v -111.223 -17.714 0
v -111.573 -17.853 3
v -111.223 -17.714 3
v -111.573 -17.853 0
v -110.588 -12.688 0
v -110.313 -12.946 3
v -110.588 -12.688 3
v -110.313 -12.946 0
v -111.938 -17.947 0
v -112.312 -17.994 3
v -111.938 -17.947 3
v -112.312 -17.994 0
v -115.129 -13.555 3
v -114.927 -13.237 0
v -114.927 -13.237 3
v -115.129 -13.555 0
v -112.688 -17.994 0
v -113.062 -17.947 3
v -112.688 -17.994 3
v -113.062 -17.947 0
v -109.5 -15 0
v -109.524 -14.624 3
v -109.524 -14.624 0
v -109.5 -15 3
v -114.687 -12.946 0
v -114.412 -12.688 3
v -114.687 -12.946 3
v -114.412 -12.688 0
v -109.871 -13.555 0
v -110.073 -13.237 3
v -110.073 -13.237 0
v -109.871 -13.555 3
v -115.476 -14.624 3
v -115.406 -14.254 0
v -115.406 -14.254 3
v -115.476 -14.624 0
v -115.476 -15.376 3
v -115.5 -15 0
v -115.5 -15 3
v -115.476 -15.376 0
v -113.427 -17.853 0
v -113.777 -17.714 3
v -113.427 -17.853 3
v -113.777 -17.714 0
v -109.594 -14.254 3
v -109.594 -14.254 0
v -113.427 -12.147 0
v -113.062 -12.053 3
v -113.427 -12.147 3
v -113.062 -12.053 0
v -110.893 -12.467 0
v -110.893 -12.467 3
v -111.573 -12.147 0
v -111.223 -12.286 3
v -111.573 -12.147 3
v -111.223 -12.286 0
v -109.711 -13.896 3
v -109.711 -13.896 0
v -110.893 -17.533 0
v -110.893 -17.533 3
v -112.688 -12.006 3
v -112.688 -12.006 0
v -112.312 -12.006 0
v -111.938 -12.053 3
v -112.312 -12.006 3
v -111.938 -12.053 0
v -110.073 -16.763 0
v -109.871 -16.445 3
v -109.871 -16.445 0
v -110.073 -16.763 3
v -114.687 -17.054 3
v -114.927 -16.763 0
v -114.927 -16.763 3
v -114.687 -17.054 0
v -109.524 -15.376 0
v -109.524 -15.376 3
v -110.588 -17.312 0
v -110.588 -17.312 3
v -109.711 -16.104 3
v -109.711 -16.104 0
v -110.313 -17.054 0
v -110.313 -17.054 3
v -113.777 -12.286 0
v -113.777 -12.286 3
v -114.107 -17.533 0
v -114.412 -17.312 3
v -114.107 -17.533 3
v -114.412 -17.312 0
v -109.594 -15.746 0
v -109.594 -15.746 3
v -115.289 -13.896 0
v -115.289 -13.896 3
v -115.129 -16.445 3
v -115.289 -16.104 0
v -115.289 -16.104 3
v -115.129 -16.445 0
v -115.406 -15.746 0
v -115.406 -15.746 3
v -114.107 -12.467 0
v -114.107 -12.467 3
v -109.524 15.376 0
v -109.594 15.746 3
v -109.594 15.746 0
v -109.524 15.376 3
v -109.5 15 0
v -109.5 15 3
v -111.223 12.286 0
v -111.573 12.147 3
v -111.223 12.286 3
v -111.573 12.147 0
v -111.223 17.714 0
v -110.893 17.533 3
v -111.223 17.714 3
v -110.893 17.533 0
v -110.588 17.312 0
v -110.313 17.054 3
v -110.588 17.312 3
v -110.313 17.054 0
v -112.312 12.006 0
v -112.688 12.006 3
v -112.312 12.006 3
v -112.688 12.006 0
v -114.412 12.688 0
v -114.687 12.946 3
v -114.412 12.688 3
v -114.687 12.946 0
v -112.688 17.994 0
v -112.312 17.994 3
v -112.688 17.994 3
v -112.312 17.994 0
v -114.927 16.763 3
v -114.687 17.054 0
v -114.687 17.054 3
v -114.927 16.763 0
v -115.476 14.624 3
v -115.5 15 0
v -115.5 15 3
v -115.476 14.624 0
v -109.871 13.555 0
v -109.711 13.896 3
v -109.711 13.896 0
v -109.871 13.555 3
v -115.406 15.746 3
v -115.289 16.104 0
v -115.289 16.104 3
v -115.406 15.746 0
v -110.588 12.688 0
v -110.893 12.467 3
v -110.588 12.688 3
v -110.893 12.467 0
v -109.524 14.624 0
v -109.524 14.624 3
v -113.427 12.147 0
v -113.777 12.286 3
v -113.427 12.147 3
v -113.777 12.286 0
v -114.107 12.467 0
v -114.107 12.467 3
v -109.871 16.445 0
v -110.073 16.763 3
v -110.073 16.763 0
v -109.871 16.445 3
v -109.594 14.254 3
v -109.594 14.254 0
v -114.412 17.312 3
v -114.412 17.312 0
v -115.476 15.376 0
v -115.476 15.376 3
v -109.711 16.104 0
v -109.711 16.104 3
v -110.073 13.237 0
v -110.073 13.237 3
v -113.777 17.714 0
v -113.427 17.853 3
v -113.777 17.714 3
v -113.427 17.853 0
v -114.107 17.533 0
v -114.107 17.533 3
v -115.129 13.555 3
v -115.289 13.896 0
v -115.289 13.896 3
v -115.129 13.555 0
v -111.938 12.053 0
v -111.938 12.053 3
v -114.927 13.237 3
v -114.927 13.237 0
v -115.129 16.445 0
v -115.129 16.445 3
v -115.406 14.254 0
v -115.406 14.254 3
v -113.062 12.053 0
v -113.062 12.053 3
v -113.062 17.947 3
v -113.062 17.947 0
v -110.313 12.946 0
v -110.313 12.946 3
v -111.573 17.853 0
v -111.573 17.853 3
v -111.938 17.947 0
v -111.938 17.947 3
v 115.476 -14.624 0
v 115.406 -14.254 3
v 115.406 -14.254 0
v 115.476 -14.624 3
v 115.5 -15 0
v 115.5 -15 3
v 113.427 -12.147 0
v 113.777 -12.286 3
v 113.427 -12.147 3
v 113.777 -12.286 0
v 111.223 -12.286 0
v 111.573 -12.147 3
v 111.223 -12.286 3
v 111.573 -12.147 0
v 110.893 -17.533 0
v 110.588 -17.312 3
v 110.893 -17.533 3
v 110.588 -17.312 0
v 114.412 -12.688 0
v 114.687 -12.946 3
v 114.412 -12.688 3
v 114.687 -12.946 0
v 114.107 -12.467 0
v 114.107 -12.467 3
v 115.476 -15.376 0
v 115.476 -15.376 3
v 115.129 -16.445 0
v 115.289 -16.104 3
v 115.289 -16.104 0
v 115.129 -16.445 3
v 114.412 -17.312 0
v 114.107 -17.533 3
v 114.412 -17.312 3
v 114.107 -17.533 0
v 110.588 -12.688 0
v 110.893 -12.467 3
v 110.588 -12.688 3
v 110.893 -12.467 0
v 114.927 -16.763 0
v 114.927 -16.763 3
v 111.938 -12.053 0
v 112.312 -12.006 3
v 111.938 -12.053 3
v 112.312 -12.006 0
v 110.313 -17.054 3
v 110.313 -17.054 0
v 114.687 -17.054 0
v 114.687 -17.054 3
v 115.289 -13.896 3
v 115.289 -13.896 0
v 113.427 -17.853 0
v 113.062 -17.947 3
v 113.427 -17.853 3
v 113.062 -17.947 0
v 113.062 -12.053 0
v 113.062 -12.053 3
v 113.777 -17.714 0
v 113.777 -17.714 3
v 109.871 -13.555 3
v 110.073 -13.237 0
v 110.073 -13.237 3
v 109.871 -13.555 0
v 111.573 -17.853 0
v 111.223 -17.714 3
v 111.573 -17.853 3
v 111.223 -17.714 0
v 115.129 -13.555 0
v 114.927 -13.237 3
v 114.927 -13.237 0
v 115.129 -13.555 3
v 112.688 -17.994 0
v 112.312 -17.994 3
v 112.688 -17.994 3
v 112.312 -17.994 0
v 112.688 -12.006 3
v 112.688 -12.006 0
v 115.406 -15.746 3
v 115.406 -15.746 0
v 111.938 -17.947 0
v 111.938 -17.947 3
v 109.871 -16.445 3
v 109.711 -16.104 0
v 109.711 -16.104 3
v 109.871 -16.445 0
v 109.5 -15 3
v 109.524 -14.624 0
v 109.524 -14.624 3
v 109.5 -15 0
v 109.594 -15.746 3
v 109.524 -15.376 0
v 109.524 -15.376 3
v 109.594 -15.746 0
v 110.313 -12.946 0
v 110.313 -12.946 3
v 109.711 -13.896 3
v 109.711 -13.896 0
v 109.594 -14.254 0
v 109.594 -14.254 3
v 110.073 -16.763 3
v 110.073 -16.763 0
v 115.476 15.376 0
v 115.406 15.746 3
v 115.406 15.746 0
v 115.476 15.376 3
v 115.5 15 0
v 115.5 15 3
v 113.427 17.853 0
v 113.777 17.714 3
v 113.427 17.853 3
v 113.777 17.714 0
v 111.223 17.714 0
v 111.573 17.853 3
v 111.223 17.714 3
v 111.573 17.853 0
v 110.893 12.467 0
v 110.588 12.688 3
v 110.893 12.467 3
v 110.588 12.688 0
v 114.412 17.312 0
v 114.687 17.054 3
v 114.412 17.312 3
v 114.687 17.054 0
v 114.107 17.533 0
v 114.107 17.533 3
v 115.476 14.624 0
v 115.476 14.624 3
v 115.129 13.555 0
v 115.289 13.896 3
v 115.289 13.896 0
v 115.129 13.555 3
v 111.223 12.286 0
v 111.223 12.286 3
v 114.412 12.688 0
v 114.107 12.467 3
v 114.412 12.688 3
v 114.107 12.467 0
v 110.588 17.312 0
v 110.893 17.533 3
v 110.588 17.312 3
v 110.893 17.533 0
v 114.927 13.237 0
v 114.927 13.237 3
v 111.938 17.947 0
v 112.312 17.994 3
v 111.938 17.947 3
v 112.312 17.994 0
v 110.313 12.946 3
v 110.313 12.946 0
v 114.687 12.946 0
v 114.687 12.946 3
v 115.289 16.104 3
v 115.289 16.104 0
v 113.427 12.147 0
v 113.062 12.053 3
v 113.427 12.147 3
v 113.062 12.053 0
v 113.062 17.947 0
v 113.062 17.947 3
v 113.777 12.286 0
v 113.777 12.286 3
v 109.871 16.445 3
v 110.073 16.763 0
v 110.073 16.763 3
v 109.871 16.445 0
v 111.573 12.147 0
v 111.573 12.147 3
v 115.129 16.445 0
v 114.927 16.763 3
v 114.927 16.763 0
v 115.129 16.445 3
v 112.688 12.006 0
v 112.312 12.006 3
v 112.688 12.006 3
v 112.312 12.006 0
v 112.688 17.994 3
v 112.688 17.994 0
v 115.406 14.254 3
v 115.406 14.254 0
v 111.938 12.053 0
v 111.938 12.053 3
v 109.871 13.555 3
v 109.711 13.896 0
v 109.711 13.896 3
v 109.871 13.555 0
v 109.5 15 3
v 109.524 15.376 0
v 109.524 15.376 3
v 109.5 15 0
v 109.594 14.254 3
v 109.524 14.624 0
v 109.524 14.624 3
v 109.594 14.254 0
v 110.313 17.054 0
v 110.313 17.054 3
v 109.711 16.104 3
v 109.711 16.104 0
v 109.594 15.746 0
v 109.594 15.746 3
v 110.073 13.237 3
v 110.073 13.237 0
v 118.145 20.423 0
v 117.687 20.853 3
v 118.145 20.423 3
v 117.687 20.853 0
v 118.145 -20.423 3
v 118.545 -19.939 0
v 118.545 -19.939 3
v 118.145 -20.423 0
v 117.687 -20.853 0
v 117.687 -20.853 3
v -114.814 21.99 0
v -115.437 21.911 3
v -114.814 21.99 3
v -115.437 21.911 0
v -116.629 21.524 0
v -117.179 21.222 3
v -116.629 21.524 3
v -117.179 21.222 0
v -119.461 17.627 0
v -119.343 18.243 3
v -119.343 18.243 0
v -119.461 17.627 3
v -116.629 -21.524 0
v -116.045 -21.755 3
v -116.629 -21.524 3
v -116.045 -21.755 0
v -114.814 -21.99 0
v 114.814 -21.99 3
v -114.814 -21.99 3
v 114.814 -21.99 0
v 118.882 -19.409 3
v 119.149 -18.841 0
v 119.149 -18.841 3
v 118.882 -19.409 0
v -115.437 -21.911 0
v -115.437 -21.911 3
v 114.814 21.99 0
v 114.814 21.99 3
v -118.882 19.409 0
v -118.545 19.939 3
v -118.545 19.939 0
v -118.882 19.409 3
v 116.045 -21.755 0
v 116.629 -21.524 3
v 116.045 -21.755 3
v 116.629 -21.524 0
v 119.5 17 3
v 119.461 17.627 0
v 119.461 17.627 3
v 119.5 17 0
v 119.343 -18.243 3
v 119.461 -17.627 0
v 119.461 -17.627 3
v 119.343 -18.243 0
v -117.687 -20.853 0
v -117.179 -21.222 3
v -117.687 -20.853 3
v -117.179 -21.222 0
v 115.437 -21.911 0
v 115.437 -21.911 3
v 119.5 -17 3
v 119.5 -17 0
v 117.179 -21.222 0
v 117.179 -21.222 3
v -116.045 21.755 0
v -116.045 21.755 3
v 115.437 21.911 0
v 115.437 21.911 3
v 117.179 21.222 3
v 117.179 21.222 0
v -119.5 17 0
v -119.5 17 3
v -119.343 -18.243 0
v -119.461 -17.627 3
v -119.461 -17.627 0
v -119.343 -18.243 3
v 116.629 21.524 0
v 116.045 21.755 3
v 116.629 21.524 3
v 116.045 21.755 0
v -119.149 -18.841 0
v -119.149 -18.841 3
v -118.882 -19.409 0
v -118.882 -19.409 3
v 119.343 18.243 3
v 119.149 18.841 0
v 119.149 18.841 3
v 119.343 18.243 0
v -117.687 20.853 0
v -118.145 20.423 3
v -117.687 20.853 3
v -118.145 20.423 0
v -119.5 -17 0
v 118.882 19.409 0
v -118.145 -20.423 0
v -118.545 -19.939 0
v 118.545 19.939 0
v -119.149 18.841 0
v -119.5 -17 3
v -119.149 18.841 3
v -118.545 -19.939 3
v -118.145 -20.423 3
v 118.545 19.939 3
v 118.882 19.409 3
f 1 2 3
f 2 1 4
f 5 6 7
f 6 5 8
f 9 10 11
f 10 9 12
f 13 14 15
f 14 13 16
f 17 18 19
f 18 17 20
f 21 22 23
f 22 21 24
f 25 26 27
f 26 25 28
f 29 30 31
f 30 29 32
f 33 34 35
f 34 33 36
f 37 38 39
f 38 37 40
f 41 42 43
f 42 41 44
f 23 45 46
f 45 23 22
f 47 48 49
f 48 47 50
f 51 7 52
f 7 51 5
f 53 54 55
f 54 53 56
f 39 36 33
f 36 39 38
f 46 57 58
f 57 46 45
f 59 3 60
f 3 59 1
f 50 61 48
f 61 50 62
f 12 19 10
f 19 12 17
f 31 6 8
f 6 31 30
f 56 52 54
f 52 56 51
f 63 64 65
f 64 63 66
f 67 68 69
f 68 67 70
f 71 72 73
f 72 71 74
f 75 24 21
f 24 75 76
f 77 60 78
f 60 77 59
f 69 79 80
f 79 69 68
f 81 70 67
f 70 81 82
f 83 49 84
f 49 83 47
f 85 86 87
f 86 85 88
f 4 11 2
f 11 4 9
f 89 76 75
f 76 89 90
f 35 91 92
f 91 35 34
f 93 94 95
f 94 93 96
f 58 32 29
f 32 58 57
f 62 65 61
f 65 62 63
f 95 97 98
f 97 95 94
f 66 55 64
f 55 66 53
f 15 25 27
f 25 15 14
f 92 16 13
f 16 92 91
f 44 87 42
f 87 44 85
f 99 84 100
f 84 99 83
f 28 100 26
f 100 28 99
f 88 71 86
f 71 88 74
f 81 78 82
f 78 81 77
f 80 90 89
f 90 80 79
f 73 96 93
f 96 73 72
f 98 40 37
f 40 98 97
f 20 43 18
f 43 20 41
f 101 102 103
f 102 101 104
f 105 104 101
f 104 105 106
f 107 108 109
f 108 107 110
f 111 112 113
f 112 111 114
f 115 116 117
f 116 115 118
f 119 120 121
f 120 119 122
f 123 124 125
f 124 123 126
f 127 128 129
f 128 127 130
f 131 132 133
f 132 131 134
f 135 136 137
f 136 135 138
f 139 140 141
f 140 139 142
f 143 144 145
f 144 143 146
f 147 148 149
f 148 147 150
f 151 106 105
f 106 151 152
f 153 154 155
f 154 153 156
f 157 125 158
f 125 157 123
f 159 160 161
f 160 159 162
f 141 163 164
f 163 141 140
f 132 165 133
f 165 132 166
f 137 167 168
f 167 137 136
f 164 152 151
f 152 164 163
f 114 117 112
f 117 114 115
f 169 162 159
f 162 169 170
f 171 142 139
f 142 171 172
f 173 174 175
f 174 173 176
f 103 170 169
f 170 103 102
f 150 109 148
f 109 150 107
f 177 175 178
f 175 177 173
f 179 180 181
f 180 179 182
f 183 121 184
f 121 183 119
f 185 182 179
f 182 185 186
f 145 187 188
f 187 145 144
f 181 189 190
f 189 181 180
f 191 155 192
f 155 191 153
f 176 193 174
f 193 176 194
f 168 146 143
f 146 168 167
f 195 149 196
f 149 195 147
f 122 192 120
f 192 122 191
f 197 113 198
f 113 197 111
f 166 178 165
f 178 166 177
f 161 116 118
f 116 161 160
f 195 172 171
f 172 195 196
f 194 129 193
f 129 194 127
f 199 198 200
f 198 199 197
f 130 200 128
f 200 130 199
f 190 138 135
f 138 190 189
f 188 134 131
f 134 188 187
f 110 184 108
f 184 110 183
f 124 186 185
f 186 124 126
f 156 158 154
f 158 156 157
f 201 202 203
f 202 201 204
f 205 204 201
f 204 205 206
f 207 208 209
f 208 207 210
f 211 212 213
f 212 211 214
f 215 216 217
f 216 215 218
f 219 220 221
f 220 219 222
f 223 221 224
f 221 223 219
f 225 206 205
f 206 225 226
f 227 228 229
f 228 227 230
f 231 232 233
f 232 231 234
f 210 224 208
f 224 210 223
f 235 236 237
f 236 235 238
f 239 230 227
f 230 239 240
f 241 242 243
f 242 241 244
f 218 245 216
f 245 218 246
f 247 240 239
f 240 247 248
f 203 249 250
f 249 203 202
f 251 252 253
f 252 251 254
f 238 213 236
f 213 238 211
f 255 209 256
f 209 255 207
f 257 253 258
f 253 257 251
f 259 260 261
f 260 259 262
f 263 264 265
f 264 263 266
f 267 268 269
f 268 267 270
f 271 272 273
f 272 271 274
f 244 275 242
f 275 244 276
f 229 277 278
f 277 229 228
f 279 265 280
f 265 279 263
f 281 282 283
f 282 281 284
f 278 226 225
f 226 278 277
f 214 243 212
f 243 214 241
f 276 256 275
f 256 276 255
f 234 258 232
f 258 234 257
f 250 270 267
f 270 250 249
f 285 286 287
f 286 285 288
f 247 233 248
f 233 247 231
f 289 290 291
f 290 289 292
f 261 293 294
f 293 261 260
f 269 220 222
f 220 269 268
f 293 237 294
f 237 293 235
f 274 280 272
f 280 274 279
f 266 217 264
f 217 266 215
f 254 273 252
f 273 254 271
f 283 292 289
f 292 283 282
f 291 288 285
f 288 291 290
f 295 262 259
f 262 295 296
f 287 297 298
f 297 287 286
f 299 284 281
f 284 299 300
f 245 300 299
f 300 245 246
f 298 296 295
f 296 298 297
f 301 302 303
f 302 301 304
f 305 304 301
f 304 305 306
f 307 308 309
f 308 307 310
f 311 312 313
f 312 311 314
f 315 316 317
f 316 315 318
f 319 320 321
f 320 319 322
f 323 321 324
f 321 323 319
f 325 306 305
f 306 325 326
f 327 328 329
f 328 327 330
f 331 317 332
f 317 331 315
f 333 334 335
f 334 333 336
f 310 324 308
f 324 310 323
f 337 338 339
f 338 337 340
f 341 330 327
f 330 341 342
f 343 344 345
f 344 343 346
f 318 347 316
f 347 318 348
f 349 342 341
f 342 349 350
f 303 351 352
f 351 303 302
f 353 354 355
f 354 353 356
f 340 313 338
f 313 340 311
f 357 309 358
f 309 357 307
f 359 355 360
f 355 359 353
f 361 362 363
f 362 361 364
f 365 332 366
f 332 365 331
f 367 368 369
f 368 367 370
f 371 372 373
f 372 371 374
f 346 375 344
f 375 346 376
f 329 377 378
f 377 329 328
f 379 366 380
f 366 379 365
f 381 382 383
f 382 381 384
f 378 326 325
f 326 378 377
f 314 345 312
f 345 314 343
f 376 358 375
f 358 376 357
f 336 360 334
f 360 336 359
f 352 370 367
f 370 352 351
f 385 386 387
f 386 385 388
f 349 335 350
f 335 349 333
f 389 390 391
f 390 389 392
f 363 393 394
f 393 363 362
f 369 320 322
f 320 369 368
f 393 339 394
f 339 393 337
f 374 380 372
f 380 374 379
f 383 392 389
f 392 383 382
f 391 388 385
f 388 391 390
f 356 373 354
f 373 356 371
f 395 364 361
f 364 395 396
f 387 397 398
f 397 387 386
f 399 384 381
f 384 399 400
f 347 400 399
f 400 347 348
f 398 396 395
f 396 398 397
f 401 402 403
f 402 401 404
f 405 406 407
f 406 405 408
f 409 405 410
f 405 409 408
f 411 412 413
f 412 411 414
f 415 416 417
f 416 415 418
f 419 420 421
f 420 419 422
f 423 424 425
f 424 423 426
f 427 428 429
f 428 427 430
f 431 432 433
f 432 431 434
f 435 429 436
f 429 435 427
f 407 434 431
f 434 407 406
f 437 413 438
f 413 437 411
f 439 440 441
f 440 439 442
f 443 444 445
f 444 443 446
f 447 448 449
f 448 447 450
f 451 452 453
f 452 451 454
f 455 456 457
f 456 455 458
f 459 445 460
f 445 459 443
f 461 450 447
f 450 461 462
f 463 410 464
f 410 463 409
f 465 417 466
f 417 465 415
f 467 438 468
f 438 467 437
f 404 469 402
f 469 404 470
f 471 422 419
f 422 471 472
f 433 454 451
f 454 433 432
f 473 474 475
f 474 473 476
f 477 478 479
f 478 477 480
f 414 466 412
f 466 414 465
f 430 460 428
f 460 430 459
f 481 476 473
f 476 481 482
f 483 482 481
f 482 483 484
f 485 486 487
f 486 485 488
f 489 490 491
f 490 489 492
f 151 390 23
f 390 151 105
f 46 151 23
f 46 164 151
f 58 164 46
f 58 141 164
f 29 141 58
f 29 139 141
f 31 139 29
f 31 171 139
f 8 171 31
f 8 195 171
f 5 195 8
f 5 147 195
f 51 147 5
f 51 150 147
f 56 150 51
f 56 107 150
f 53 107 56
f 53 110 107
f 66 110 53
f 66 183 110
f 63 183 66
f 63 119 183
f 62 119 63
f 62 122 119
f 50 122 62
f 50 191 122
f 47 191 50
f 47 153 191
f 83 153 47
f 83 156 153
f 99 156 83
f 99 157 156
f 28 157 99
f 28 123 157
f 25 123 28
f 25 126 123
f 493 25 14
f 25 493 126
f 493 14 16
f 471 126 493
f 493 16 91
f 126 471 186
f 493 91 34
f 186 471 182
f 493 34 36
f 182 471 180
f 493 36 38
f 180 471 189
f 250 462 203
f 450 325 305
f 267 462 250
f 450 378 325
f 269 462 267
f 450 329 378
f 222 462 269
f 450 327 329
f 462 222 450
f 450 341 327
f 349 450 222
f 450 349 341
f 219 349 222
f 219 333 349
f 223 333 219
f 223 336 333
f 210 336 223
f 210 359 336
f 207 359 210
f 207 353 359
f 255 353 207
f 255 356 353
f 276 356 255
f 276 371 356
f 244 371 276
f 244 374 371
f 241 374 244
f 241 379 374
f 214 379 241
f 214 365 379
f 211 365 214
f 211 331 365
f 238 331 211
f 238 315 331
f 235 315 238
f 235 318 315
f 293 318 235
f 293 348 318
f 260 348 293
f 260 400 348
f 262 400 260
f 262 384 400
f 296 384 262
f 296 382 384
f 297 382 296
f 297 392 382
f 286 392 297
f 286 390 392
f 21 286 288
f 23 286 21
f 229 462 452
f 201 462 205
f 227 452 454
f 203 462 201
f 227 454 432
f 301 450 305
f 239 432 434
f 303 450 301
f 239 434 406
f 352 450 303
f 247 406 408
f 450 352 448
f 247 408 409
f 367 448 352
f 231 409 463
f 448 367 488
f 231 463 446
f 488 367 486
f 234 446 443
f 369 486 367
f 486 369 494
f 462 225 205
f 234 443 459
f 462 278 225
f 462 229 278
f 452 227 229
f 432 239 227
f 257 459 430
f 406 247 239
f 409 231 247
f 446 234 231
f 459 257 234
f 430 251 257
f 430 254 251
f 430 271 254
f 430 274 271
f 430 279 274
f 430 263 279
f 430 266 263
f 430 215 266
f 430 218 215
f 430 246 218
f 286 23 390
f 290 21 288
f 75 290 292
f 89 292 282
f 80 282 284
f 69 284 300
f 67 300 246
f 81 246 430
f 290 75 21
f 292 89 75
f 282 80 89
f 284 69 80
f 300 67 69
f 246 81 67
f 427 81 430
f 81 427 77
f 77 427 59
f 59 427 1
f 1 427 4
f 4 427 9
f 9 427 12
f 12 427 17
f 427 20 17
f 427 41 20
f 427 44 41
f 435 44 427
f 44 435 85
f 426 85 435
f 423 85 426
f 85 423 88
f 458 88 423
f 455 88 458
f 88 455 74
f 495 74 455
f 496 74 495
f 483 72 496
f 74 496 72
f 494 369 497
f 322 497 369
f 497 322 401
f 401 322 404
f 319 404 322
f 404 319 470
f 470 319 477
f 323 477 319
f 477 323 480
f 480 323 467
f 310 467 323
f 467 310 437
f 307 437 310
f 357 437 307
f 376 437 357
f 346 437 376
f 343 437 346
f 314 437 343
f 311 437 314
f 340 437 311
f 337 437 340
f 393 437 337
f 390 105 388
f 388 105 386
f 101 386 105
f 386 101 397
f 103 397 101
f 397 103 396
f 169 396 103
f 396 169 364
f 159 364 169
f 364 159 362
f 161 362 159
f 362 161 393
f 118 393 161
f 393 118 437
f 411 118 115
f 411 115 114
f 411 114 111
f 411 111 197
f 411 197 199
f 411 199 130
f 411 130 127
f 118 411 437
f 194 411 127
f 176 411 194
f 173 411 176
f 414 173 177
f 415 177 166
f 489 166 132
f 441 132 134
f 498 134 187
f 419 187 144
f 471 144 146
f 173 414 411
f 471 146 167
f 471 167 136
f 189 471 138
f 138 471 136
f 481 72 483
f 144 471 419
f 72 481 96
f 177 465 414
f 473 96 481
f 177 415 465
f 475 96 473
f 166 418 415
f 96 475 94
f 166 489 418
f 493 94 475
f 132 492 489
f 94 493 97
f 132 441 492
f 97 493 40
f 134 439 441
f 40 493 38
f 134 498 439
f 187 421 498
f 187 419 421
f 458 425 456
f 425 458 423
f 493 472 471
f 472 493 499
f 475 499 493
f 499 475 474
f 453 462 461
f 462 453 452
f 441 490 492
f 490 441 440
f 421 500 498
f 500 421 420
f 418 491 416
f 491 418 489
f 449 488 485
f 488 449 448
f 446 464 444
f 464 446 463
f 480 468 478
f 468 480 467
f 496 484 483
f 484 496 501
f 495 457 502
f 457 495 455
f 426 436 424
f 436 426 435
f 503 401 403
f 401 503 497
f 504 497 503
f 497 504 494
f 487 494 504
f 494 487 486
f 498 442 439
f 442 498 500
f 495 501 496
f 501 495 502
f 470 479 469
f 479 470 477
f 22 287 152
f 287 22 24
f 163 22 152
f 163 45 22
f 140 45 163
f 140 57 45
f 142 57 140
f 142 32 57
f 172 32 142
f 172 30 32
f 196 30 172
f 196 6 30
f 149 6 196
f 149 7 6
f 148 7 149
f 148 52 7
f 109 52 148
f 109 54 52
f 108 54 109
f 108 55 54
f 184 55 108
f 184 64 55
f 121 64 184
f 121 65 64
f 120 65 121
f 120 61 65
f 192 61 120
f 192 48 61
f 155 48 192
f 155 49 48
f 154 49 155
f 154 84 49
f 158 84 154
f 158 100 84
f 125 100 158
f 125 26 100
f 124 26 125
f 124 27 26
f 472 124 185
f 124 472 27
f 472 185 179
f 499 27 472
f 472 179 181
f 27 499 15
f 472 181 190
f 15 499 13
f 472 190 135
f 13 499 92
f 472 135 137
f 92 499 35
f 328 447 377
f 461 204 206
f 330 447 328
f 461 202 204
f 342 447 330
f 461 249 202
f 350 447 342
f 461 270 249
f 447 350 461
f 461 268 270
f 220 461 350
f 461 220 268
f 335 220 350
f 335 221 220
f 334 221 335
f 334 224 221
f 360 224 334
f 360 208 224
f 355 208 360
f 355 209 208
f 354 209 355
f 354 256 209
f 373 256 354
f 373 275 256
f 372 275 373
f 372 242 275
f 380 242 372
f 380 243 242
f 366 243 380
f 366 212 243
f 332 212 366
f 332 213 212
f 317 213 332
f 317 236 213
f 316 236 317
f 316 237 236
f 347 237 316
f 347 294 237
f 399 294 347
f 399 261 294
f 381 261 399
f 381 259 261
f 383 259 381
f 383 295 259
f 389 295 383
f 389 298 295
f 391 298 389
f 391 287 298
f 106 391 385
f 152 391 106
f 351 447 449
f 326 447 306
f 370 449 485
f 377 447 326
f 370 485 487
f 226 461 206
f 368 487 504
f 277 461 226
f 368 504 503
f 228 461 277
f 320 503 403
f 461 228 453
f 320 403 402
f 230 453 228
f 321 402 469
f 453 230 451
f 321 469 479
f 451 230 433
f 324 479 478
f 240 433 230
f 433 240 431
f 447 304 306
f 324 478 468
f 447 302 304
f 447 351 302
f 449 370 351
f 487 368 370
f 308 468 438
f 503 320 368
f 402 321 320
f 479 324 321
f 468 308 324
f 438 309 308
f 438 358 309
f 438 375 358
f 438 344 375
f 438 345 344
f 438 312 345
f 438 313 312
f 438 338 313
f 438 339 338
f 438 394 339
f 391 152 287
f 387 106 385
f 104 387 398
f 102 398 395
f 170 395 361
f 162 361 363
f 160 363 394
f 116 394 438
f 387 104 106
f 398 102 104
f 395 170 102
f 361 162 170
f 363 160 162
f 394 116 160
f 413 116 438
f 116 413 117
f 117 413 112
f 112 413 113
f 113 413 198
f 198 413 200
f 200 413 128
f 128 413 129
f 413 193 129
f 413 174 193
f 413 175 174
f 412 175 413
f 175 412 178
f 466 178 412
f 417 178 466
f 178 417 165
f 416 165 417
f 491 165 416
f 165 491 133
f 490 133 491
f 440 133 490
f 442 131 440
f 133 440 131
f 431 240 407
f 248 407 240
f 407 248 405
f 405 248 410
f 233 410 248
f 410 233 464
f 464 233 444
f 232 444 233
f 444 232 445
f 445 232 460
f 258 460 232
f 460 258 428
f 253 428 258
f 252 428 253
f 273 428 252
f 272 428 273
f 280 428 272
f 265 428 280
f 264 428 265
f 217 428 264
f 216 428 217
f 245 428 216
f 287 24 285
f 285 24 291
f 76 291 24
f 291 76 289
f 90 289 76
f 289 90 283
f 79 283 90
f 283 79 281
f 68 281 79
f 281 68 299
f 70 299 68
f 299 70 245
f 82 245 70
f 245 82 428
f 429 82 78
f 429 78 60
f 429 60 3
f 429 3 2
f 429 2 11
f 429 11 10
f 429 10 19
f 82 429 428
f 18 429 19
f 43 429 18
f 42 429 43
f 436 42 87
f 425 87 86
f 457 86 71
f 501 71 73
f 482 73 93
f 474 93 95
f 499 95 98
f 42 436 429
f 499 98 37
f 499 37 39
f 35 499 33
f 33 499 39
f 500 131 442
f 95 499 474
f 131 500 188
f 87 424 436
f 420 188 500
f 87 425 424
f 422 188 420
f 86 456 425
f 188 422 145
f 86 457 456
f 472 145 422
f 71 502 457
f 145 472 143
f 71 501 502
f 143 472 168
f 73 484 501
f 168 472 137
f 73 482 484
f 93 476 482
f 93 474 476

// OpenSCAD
$fn = 50;


difference() {
	union() {
		hull() {
			translate(v = [-114.5000000000, 17.0000000000, 0]) {
				cylinder(h = 3, r = 5);
			}
			translate(v = [114.5000000000, 17.0000000000, 0]) {
				cylinder(h = 3, r = 5);
			}
			translate(v = [-114.5000000000, -17.0000000000, 0]) {
				cylinder(h = 3, r = 5);
			}
			translate(v = [114.5000000000, -17.0000000000, 0]) {
				cylinder(h = 3, r = 5);
			}
		}
	}
	union() {
		translate(v = [-112.5000000000, -15.0000000000, -100.0000000000]) {
			cylinder(h = 200, r = 3.0000000000);
		}
		translate(v = [-112.5000000000, 15.0000000000, -100.0000000000]) {
			cylinder(h = 200, r = 3.0000000000);
		}
		translate(v = [112.5000000000, -15.0000000000, -100.0000000000]) {
			cylinder(h = 200, r = 3.0000000000);
		}
		translate(v = [112.5000000000, 15.0000000000, -100.0000000000]) {
			cylinder(h = 200, r = 3.0000000000);
		}
	}
}
